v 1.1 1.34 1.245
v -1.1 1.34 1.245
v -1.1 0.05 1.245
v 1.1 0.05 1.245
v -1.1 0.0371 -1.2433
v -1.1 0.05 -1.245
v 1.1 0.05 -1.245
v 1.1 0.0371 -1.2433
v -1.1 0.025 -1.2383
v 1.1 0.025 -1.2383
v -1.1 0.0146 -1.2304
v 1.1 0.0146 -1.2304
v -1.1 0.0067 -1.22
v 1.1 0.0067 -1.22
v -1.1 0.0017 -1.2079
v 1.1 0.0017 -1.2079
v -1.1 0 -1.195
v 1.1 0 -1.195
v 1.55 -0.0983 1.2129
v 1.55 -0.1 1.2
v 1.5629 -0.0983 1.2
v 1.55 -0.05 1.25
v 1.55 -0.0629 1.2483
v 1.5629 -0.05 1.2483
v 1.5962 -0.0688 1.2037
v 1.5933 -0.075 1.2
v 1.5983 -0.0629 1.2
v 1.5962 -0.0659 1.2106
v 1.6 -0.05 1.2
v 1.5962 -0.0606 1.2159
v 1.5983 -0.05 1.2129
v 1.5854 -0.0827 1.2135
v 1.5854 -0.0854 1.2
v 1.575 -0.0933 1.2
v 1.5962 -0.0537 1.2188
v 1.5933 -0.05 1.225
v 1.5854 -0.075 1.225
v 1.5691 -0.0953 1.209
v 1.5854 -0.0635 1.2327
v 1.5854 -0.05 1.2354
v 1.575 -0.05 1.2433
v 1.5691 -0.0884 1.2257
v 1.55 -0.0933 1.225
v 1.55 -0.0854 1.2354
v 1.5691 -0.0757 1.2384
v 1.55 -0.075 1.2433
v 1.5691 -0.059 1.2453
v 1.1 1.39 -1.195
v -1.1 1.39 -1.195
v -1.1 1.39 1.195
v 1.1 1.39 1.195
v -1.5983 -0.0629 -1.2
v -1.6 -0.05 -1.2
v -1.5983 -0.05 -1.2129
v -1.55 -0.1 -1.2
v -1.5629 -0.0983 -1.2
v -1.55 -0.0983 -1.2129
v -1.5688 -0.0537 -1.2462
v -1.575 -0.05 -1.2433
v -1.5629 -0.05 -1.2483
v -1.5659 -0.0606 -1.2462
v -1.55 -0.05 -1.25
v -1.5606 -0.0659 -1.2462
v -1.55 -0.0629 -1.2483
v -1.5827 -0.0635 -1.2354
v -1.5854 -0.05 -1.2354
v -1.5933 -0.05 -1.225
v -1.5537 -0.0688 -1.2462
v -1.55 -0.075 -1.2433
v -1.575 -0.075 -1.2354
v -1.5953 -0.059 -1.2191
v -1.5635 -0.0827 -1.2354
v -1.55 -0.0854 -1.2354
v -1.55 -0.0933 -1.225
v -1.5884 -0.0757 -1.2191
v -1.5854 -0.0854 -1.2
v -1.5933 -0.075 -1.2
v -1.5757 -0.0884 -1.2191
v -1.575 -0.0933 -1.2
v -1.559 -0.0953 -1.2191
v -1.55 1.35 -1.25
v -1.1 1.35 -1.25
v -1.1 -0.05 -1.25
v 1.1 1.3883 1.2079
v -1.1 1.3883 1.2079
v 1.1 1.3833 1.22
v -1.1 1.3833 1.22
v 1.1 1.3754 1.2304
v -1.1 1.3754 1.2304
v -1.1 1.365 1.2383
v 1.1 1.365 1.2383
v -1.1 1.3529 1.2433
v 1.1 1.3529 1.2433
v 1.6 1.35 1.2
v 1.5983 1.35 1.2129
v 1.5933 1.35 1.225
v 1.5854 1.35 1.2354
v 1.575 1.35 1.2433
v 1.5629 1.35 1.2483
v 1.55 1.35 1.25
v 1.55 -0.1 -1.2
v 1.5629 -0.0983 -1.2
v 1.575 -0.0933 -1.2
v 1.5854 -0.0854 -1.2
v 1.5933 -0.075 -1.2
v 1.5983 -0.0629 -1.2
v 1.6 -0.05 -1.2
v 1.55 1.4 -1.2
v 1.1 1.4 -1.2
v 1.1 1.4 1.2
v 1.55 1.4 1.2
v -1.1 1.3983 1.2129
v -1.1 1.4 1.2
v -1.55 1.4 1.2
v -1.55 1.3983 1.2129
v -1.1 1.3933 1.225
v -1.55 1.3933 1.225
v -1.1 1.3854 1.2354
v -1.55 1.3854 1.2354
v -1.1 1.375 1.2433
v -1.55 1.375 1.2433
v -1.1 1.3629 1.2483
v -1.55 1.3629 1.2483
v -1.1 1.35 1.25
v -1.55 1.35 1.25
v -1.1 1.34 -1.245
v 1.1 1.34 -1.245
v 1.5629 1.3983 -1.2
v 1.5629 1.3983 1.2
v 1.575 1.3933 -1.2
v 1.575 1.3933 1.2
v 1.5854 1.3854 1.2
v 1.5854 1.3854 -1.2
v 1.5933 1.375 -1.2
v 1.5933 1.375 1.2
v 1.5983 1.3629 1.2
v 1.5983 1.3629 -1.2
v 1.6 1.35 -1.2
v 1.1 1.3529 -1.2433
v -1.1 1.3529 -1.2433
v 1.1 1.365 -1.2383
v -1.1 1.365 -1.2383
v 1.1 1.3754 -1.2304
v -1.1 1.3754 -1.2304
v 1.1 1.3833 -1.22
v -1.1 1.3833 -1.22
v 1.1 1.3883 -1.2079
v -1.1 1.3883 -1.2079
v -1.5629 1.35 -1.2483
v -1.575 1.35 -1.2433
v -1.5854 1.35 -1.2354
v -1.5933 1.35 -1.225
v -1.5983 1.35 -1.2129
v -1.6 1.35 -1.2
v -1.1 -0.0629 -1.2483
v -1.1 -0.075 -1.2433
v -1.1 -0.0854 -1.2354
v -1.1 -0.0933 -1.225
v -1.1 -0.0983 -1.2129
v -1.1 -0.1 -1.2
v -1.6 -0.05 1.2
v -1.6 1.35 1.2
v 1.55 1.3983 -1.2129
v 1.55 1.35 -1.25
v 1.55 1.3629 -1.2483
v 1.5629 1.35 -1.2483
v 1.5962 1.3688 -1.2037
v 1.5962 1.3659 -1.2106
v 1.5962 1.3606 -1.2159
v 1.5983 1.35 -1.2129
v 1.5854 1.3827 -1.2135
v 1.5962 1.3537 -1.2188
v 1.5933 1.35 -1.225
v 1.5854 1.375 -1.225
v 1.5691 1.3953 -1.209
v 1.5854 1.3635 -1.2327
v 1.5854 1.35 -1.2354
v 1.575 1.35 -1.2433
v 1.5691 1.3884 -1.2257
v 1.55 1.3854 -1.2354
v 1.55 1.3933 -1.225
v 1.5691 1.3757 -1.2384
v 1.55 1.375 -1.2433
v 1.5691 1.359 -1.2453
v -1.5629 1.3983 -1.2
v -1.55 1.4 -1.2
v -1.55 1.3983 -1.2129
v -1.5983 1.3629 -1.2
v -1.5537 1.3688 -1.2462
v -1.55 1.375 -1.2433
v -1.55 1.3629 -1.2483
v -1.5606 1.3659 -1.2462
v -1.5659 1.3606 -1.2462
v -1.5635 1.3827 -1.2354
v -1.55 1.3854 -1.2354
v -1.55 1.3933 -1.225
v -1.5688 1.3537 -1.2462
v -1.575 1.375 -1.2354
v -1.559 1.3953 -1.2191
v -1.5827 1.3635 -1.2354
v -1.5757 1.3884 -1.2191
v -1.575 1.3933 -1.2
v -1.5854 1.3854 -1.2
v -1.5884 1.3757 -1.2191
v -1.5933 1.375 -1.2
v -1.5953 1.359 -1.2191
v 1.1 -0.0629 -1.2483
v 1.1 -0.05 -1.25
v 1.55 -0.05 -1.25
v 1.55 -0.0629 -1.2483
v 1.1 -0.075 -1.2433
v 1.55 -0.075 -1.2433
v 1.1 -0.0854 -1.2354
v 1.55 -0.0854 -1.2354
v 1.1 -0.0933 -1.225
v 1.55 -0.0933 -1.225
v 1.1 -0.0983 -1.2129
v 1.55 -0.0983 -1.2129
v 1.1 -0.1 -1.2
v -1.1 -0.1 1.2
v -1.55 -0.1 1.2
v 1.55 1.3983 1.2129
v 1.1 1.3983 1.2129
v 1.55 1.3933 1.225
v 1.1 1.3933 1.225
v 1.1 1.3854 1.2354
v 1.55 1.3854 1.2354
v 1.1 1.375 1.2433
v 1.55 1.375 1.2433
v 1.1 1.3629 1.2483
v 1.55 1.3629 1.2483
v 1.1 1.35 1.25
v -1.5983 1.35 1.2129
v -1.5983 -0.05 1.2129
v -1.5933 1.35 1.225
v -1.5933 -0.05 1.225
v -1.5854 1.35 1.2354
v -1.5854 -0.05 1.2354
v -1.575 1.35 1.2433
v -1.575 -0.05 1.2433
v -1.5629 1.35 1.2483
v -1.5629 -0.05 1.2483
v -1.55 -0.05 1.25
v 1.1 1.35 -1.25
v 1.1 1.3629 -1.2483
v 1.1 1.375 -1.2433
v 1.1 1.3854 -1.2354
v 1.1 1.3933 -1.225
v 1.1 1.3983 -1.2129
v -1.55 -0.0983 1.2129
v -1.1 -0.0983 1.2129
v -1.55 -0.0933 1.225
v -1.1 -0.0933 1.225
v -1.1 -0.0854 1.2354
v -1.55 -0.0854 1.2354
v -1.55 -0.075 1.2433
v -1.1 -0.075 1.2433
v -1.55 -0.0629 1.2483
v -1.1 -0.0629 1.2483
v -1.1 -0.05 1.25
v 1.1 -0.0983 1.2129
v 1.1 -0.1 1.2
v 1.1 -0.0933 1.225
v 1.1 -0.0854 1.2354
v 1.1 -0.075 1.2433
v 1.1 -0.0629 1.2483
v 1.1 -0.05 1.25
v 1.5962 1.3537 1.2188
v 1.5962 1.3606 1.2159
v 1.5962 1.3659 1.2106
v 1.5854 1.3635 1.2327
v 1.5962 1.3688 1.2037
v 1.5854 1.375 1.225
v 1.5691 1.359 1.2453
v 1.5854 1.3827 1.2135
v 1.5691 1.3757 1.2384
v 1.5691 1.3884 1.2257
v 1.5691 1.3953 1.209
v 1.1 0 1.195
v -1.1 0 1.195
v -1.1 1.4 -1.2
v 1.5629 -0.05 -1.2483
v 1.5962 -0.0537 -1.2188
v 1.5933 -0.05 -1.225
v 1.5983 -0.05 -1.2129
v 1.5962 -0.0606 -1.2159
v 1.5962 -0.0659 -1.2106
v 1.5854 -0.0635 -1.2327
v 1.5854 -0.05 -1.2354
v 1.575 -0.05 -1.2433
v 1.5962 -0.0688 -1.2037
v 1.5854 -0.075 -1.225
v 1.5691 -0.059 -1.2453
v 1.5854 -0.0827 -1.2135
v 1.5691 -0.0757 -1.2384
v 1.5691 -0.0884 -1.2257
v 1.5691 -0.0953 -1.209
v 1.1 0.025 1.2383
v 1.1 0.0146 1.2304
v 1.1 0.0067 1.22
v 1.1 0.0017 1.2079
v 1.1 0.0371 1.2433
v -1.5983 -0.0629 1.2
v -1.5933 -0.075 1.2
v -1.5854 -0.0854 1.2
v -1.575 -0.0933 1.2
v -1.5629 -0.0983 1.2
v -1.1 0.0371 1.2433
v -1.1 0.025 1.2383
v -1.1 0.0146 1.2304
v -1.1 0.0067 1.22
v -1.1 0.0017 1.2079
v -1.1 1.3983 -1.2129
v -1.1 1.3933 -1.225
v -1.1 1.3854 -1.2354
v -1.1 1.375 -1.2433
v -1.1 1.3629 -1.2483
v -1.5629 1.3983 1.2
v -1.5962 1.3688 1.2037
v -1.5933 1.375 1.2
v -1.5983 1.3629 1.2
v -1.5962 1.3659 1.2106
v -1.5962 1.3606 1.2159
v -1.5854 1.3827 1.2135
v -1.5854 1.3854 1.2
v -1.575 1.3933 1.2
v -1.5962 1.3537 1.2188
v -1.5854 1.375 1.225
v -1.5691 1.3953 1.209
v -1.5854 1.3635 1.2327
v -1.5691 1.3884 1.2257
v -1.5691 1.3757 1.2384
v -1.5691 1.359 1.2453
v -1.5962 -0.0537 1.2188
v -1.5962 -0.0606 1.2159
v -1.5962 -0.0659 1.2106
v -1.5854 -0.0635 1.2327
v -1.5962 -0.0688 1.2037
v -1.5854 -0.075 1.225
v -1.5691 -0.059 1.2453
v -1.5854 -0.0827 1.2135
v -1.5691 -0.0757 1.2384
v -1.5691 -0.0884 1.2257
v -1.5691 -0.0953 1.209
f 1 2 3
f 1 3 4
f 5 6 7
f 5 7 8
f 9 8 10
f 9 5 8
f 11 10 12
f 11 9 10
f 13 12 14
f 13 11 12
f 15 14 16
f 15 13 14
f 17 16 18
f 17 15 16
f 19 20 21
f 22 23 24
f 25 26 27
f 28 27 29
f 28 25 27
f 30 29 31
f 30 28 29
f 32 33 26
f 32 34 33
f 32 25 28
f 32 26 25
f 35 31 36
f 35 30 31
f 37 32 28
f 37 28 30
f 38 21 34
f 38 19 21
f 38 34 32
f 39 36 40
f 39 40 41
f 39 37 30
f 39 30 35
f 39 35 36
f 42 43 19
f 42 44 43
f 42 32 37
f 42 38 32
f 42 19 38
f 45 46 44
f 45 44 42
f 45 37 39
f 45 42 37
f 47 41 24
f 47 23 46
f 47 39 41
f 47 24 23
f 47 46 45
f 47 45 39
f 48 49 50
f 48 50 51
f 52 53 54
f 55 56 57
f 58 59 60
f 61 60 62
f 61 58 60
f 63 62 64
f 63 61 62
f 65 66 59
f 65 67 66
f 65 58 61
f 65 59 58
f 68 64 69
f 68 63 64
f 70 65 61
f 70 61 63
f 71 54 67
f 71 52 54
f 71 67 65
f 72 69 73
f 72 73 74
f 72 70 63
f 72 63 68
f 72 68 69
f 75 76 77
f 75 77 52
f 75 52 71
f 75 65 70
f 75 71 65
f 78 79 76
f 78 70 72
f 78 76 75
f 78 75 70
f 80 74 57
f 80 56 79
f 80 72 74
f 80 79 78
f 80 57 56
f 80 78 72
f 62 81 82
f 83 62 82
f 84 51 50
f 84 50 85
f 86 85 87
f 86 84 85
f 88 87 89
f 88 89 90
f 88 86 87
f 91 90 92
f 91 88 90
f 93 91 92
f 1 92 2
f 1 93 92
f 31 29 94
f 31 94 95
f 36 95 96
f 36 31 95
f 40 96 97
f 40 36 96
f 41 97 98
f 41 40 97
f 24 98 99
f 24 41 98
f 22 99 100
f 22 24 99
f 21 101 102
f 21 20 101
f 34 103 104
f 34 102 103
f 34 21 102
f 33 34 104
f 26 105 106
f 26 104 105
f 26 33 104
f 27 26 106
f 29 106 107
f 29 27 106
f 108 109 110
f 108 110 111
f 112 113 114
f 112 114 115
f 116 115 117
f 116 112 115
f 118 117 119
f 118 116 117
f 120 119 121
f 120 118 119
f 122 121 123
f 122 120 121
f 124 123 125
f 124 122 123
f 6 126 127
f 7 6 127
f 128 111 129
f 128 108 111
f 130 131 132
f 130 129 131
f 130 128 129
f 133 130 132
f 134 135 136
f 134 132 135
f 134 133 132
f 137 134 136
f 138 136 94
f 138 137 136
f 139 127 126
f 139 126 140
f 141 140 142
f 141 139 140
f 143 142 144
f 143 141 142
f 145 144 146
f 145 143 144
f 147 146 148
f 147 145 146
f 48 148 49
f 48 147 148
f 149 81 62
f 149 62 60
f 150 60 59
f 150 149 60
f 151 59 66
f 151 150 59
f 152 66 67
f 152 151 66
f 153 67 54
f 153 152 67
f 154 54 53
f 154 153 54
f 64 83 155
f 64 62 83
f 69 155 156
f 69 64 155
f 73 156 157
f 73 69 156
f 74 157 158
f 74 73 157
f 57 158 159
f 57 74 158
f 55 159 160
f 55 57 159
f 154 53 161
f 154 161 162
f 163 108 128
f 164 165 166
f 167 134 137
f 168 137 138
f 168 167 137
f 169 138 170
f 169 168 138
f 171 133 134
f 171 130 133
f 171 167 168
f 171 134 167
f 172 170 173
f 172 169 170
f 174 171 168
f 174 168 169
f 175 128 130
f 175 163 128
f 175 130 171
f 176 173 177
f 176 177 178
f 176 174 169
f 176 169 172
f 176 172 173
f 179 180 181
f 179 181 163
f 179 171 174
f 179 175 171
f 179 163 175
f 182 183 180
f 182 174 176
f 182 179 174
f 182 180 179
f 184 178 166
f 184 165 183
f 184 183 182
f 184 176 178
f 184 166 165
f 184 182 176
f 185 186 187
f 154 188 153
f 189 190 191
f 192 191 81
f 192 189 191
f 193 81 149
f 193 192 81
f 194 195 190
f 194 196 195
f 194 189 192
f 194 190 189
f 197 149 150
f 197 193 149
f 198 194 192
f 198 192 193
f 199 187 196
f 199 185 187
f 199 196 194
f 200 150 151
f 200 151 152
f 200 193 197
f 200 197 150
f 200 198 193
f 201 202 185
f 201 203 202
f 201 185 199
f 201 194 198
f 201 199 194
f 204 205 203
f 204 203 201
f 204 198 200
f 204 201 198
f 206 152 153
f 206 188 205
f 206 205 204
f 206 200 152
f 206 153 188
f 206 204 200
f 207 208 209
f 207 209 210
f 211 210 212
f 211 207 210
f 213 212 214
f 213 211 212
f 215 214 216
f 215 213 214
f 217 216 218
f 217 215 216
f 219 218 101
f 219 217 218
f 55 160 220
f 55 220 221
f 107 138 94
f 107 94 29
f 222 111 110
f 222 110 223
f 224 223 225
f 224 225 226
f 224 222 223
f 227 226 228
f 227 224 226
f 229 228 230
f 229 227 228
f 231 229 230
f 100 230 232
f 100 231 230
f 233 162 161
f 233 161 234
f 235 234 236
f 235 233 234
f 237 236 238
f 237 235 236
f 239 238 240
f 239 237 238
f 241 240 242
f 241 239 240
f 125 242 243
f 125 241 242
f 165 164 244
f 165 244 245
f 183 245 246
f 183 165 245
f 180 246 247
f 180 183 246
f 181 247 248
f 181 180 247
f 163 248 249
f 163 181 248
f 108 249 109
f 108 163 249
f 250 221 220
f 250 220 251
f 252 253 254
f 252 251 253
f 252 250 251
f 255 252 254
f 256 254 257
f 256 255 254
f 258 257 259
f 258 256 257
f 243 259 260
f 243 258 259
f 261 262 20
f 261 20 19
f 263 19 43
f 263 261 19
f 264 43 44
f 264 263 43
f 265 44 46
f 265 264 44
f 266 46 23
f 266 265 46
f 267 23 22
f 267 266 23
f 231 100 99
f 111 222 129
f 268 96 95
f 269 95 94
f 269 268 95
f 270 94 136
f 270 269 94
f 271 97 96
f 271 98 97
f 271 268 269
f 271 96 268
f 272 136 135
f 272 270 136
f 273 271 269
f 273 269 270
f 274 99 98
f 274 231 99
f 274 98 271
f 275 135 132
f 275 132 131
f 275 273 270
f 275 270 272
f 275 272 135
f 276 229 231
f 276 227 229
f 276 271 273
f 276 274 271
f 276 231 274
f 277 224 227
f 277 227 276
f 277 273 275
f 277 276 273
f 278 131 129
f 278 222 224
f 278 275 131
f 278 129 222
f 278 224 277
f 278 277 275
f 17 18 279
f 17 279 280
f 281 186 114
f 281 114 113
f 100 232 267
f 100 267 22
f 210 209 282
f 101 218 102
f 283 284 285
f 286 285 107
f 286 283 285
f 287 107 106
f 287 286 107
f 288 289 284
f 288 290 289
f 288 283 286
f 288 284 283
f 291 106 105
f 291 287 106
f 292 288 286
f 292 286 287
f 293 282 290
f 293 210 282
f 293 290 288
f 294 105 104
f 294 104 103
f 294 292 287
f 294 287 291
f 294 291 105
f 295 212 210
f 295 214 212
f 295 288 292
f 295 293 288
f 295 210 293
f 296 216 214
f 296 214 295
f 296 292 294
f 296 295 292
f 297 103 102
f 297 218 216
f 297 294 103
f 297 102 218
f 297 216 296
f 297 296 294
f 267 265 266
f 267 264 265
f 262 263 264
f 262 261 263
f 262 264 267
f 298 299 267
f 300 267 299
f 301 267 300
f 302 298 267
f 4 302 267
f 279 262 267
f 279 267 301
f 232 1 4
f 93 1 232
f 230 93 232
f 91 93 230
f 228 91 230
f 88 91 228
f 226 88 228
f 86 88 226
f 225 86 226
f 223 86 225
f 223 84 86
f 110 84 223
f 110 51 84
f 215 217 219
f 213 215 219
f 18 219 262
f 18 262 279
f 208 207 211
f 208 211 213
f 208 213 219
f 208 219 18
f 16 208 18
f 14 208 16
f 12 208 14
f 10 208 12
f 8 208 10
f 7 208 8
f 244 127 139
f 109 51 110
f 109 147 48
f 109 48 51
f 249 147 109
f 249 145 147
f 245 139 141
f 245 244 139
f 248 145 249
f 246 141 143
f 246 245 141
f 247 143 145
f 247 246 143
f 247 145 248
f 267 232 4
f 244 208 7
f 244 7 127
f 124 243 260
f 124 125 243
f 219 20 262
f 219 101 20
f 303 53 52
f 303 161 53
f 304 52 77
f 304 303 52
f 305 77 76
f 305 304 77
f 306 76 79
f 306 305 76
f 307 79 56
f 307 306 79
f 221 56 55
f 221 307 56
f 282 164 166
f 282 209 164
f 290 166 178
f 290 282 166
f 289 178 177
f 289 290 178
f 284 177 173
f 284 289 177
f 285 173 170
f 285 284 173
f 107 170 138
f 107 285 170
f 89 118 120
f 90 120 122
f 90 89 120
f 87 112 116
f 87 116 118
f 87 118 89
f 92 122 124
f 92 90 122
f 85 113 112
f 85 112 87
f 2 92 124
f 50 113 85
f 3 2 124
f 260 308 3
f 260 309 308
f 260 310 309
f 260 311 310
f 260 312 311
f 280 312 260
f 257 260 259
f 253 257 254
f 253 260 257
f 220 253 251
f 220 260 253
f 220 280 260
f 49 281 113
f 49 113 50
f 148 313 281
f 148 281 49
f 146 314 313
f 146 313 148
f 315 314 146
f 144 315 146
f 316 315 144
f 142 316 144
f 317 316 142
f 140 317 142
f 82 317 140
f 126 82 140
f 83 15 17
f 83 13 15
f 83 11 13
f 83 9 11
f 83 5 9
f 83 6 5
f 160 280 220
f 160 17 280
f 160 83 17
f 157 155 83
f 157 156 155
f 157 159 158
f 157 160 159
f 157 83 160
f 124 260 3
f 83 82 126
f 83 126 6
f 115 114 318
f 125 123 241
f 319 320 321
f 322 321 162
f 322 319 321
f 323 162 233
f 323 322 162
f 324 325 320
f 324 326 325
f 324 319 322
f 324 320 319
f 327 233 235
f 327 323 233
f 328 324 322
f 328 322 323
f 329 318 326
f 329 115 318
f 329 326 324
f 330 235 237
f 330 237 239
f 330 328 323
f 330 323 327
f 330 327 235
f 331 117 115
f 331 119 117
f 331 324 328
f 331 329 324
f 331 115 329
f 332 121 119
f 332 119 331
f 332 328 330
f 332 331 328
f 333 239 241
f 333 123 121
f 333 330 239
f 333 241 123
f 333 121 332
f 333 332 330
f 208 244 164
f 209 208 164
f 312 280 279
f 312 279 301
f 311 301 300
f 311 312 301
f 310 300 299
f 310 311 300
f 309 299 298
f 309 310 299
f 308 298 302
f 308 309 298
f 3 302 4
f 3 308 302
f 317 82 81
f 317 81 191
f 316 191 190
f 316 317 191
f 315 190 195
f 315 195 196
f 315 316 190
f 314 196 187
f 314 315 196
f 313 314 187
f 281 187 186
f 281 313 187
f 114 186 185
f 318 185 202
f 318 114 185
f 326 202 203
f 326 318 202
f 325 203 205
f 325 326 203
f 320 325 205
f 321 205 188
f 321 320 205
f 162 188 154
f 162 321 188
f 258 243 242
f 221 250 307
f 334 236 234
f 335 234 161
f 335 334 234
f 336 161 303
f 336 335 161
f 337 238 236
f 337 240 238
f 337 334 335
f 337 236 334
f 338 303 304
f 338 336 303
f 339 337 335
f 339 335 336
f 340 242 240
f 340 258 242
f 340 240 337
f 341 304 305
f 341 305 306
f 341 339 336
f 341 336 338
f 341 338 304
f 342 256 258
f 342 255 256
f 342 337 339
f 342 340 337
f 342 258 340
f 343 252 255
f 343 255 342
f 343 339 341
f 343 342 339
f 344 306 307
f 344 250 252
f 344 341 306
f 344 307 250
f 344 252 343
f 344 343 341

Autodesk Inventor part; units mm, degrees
ref_plane "YZ Plane" through (0, 0, 0) normal (1, 0, 0) x (0, 1, 0)
ref_plane "XZ Plane" through (0, 0, 0) normal (0, 1, 0) x (-1, 0, 0)
ref_plane "XY Plane" through (0, 0, 0) normal (0, 0, 1) x (1, 0, 0)
sketch "Sketch1" plane through (0, 0, 0) normal (0, 0, 1) x (1, 0, 0)
  line L0 (-1.6, 1.4) -> (-1.1, 1.4)
  line L1 (-1.1, 1.4) -> (-1.1, -0.1)
  line L2 (-1.1, -0.1) -> (-1.6, -0.1)
  line L3 (-1.6, -0.1) -> (-1.6, 1.4)
  line L4 (-1.1, 1.39) -> (1.1, 1.39)
  line L5 (1.1, 1.39) -> (1.1, 0)
  line L6 (1.1, 0) -> (-1.1, 0)
  line L7 (-1.1, 0) -> (-1.1, 1.39)
  line L8 (1.1, 1.4) -> (1.6, 1.4)
  line L9 (1.6, 1.4) -> (1.6, -0.1)
  line L10 (1.6, -0.1) -> (1.1, -0.1)
  line L11 (1.1, -0.1) -> (1.1, 1.4)
  point P0 (0, 0)
  point P1 (0, 1.39)
  point P2 (0, 0)
  dimension "d0" = 3.2
  dimension "d1" = 1.5
  dimension "d2" = 0.5
  dimension "d3" = 0.1
  dimension "d6" = 0.01
extrude "Extrusion1" add sketch "Sketch1" along normal mid plane 2.5 contours L0 L1 L2 L3 | L11 L8 L9 L10 L5
extrude "Extrusion2" add sketch "Sketch1" along normal mid plane 2.49 contours L4 L5 L6 L1
fillet "Fillet1" radius 0.05 20 edges at (0, 1.39, 1.245) (0, 0, 1.245) (0, 1.39, -1.245) (0, 0, -1.245) (-1.35, 1.4, 1.25) (-1.35, -0.1, 1.25) (1.35, -0.1, 1.25) (1.35, 1.4, 1.25) (1.35, 1.4, -1.25) (1.35, -0.1, -1.25) (1.6, 0.65, -1.25) (1.6, -0.1, 0) (1.6, 0.65, 1.25) (1.6, 1.4, 0) (-1.6, 1.4, 0) (-1.6, 0.65, 1.25) (-1.6, -0.1, 0) (-1.35, 1.4, -1.25) (-1.35, -0.1, -1.25) (-1.6, 0.65, -1.25)
properties part number "Capacitor_3216-1.6mm" material "Copper"
